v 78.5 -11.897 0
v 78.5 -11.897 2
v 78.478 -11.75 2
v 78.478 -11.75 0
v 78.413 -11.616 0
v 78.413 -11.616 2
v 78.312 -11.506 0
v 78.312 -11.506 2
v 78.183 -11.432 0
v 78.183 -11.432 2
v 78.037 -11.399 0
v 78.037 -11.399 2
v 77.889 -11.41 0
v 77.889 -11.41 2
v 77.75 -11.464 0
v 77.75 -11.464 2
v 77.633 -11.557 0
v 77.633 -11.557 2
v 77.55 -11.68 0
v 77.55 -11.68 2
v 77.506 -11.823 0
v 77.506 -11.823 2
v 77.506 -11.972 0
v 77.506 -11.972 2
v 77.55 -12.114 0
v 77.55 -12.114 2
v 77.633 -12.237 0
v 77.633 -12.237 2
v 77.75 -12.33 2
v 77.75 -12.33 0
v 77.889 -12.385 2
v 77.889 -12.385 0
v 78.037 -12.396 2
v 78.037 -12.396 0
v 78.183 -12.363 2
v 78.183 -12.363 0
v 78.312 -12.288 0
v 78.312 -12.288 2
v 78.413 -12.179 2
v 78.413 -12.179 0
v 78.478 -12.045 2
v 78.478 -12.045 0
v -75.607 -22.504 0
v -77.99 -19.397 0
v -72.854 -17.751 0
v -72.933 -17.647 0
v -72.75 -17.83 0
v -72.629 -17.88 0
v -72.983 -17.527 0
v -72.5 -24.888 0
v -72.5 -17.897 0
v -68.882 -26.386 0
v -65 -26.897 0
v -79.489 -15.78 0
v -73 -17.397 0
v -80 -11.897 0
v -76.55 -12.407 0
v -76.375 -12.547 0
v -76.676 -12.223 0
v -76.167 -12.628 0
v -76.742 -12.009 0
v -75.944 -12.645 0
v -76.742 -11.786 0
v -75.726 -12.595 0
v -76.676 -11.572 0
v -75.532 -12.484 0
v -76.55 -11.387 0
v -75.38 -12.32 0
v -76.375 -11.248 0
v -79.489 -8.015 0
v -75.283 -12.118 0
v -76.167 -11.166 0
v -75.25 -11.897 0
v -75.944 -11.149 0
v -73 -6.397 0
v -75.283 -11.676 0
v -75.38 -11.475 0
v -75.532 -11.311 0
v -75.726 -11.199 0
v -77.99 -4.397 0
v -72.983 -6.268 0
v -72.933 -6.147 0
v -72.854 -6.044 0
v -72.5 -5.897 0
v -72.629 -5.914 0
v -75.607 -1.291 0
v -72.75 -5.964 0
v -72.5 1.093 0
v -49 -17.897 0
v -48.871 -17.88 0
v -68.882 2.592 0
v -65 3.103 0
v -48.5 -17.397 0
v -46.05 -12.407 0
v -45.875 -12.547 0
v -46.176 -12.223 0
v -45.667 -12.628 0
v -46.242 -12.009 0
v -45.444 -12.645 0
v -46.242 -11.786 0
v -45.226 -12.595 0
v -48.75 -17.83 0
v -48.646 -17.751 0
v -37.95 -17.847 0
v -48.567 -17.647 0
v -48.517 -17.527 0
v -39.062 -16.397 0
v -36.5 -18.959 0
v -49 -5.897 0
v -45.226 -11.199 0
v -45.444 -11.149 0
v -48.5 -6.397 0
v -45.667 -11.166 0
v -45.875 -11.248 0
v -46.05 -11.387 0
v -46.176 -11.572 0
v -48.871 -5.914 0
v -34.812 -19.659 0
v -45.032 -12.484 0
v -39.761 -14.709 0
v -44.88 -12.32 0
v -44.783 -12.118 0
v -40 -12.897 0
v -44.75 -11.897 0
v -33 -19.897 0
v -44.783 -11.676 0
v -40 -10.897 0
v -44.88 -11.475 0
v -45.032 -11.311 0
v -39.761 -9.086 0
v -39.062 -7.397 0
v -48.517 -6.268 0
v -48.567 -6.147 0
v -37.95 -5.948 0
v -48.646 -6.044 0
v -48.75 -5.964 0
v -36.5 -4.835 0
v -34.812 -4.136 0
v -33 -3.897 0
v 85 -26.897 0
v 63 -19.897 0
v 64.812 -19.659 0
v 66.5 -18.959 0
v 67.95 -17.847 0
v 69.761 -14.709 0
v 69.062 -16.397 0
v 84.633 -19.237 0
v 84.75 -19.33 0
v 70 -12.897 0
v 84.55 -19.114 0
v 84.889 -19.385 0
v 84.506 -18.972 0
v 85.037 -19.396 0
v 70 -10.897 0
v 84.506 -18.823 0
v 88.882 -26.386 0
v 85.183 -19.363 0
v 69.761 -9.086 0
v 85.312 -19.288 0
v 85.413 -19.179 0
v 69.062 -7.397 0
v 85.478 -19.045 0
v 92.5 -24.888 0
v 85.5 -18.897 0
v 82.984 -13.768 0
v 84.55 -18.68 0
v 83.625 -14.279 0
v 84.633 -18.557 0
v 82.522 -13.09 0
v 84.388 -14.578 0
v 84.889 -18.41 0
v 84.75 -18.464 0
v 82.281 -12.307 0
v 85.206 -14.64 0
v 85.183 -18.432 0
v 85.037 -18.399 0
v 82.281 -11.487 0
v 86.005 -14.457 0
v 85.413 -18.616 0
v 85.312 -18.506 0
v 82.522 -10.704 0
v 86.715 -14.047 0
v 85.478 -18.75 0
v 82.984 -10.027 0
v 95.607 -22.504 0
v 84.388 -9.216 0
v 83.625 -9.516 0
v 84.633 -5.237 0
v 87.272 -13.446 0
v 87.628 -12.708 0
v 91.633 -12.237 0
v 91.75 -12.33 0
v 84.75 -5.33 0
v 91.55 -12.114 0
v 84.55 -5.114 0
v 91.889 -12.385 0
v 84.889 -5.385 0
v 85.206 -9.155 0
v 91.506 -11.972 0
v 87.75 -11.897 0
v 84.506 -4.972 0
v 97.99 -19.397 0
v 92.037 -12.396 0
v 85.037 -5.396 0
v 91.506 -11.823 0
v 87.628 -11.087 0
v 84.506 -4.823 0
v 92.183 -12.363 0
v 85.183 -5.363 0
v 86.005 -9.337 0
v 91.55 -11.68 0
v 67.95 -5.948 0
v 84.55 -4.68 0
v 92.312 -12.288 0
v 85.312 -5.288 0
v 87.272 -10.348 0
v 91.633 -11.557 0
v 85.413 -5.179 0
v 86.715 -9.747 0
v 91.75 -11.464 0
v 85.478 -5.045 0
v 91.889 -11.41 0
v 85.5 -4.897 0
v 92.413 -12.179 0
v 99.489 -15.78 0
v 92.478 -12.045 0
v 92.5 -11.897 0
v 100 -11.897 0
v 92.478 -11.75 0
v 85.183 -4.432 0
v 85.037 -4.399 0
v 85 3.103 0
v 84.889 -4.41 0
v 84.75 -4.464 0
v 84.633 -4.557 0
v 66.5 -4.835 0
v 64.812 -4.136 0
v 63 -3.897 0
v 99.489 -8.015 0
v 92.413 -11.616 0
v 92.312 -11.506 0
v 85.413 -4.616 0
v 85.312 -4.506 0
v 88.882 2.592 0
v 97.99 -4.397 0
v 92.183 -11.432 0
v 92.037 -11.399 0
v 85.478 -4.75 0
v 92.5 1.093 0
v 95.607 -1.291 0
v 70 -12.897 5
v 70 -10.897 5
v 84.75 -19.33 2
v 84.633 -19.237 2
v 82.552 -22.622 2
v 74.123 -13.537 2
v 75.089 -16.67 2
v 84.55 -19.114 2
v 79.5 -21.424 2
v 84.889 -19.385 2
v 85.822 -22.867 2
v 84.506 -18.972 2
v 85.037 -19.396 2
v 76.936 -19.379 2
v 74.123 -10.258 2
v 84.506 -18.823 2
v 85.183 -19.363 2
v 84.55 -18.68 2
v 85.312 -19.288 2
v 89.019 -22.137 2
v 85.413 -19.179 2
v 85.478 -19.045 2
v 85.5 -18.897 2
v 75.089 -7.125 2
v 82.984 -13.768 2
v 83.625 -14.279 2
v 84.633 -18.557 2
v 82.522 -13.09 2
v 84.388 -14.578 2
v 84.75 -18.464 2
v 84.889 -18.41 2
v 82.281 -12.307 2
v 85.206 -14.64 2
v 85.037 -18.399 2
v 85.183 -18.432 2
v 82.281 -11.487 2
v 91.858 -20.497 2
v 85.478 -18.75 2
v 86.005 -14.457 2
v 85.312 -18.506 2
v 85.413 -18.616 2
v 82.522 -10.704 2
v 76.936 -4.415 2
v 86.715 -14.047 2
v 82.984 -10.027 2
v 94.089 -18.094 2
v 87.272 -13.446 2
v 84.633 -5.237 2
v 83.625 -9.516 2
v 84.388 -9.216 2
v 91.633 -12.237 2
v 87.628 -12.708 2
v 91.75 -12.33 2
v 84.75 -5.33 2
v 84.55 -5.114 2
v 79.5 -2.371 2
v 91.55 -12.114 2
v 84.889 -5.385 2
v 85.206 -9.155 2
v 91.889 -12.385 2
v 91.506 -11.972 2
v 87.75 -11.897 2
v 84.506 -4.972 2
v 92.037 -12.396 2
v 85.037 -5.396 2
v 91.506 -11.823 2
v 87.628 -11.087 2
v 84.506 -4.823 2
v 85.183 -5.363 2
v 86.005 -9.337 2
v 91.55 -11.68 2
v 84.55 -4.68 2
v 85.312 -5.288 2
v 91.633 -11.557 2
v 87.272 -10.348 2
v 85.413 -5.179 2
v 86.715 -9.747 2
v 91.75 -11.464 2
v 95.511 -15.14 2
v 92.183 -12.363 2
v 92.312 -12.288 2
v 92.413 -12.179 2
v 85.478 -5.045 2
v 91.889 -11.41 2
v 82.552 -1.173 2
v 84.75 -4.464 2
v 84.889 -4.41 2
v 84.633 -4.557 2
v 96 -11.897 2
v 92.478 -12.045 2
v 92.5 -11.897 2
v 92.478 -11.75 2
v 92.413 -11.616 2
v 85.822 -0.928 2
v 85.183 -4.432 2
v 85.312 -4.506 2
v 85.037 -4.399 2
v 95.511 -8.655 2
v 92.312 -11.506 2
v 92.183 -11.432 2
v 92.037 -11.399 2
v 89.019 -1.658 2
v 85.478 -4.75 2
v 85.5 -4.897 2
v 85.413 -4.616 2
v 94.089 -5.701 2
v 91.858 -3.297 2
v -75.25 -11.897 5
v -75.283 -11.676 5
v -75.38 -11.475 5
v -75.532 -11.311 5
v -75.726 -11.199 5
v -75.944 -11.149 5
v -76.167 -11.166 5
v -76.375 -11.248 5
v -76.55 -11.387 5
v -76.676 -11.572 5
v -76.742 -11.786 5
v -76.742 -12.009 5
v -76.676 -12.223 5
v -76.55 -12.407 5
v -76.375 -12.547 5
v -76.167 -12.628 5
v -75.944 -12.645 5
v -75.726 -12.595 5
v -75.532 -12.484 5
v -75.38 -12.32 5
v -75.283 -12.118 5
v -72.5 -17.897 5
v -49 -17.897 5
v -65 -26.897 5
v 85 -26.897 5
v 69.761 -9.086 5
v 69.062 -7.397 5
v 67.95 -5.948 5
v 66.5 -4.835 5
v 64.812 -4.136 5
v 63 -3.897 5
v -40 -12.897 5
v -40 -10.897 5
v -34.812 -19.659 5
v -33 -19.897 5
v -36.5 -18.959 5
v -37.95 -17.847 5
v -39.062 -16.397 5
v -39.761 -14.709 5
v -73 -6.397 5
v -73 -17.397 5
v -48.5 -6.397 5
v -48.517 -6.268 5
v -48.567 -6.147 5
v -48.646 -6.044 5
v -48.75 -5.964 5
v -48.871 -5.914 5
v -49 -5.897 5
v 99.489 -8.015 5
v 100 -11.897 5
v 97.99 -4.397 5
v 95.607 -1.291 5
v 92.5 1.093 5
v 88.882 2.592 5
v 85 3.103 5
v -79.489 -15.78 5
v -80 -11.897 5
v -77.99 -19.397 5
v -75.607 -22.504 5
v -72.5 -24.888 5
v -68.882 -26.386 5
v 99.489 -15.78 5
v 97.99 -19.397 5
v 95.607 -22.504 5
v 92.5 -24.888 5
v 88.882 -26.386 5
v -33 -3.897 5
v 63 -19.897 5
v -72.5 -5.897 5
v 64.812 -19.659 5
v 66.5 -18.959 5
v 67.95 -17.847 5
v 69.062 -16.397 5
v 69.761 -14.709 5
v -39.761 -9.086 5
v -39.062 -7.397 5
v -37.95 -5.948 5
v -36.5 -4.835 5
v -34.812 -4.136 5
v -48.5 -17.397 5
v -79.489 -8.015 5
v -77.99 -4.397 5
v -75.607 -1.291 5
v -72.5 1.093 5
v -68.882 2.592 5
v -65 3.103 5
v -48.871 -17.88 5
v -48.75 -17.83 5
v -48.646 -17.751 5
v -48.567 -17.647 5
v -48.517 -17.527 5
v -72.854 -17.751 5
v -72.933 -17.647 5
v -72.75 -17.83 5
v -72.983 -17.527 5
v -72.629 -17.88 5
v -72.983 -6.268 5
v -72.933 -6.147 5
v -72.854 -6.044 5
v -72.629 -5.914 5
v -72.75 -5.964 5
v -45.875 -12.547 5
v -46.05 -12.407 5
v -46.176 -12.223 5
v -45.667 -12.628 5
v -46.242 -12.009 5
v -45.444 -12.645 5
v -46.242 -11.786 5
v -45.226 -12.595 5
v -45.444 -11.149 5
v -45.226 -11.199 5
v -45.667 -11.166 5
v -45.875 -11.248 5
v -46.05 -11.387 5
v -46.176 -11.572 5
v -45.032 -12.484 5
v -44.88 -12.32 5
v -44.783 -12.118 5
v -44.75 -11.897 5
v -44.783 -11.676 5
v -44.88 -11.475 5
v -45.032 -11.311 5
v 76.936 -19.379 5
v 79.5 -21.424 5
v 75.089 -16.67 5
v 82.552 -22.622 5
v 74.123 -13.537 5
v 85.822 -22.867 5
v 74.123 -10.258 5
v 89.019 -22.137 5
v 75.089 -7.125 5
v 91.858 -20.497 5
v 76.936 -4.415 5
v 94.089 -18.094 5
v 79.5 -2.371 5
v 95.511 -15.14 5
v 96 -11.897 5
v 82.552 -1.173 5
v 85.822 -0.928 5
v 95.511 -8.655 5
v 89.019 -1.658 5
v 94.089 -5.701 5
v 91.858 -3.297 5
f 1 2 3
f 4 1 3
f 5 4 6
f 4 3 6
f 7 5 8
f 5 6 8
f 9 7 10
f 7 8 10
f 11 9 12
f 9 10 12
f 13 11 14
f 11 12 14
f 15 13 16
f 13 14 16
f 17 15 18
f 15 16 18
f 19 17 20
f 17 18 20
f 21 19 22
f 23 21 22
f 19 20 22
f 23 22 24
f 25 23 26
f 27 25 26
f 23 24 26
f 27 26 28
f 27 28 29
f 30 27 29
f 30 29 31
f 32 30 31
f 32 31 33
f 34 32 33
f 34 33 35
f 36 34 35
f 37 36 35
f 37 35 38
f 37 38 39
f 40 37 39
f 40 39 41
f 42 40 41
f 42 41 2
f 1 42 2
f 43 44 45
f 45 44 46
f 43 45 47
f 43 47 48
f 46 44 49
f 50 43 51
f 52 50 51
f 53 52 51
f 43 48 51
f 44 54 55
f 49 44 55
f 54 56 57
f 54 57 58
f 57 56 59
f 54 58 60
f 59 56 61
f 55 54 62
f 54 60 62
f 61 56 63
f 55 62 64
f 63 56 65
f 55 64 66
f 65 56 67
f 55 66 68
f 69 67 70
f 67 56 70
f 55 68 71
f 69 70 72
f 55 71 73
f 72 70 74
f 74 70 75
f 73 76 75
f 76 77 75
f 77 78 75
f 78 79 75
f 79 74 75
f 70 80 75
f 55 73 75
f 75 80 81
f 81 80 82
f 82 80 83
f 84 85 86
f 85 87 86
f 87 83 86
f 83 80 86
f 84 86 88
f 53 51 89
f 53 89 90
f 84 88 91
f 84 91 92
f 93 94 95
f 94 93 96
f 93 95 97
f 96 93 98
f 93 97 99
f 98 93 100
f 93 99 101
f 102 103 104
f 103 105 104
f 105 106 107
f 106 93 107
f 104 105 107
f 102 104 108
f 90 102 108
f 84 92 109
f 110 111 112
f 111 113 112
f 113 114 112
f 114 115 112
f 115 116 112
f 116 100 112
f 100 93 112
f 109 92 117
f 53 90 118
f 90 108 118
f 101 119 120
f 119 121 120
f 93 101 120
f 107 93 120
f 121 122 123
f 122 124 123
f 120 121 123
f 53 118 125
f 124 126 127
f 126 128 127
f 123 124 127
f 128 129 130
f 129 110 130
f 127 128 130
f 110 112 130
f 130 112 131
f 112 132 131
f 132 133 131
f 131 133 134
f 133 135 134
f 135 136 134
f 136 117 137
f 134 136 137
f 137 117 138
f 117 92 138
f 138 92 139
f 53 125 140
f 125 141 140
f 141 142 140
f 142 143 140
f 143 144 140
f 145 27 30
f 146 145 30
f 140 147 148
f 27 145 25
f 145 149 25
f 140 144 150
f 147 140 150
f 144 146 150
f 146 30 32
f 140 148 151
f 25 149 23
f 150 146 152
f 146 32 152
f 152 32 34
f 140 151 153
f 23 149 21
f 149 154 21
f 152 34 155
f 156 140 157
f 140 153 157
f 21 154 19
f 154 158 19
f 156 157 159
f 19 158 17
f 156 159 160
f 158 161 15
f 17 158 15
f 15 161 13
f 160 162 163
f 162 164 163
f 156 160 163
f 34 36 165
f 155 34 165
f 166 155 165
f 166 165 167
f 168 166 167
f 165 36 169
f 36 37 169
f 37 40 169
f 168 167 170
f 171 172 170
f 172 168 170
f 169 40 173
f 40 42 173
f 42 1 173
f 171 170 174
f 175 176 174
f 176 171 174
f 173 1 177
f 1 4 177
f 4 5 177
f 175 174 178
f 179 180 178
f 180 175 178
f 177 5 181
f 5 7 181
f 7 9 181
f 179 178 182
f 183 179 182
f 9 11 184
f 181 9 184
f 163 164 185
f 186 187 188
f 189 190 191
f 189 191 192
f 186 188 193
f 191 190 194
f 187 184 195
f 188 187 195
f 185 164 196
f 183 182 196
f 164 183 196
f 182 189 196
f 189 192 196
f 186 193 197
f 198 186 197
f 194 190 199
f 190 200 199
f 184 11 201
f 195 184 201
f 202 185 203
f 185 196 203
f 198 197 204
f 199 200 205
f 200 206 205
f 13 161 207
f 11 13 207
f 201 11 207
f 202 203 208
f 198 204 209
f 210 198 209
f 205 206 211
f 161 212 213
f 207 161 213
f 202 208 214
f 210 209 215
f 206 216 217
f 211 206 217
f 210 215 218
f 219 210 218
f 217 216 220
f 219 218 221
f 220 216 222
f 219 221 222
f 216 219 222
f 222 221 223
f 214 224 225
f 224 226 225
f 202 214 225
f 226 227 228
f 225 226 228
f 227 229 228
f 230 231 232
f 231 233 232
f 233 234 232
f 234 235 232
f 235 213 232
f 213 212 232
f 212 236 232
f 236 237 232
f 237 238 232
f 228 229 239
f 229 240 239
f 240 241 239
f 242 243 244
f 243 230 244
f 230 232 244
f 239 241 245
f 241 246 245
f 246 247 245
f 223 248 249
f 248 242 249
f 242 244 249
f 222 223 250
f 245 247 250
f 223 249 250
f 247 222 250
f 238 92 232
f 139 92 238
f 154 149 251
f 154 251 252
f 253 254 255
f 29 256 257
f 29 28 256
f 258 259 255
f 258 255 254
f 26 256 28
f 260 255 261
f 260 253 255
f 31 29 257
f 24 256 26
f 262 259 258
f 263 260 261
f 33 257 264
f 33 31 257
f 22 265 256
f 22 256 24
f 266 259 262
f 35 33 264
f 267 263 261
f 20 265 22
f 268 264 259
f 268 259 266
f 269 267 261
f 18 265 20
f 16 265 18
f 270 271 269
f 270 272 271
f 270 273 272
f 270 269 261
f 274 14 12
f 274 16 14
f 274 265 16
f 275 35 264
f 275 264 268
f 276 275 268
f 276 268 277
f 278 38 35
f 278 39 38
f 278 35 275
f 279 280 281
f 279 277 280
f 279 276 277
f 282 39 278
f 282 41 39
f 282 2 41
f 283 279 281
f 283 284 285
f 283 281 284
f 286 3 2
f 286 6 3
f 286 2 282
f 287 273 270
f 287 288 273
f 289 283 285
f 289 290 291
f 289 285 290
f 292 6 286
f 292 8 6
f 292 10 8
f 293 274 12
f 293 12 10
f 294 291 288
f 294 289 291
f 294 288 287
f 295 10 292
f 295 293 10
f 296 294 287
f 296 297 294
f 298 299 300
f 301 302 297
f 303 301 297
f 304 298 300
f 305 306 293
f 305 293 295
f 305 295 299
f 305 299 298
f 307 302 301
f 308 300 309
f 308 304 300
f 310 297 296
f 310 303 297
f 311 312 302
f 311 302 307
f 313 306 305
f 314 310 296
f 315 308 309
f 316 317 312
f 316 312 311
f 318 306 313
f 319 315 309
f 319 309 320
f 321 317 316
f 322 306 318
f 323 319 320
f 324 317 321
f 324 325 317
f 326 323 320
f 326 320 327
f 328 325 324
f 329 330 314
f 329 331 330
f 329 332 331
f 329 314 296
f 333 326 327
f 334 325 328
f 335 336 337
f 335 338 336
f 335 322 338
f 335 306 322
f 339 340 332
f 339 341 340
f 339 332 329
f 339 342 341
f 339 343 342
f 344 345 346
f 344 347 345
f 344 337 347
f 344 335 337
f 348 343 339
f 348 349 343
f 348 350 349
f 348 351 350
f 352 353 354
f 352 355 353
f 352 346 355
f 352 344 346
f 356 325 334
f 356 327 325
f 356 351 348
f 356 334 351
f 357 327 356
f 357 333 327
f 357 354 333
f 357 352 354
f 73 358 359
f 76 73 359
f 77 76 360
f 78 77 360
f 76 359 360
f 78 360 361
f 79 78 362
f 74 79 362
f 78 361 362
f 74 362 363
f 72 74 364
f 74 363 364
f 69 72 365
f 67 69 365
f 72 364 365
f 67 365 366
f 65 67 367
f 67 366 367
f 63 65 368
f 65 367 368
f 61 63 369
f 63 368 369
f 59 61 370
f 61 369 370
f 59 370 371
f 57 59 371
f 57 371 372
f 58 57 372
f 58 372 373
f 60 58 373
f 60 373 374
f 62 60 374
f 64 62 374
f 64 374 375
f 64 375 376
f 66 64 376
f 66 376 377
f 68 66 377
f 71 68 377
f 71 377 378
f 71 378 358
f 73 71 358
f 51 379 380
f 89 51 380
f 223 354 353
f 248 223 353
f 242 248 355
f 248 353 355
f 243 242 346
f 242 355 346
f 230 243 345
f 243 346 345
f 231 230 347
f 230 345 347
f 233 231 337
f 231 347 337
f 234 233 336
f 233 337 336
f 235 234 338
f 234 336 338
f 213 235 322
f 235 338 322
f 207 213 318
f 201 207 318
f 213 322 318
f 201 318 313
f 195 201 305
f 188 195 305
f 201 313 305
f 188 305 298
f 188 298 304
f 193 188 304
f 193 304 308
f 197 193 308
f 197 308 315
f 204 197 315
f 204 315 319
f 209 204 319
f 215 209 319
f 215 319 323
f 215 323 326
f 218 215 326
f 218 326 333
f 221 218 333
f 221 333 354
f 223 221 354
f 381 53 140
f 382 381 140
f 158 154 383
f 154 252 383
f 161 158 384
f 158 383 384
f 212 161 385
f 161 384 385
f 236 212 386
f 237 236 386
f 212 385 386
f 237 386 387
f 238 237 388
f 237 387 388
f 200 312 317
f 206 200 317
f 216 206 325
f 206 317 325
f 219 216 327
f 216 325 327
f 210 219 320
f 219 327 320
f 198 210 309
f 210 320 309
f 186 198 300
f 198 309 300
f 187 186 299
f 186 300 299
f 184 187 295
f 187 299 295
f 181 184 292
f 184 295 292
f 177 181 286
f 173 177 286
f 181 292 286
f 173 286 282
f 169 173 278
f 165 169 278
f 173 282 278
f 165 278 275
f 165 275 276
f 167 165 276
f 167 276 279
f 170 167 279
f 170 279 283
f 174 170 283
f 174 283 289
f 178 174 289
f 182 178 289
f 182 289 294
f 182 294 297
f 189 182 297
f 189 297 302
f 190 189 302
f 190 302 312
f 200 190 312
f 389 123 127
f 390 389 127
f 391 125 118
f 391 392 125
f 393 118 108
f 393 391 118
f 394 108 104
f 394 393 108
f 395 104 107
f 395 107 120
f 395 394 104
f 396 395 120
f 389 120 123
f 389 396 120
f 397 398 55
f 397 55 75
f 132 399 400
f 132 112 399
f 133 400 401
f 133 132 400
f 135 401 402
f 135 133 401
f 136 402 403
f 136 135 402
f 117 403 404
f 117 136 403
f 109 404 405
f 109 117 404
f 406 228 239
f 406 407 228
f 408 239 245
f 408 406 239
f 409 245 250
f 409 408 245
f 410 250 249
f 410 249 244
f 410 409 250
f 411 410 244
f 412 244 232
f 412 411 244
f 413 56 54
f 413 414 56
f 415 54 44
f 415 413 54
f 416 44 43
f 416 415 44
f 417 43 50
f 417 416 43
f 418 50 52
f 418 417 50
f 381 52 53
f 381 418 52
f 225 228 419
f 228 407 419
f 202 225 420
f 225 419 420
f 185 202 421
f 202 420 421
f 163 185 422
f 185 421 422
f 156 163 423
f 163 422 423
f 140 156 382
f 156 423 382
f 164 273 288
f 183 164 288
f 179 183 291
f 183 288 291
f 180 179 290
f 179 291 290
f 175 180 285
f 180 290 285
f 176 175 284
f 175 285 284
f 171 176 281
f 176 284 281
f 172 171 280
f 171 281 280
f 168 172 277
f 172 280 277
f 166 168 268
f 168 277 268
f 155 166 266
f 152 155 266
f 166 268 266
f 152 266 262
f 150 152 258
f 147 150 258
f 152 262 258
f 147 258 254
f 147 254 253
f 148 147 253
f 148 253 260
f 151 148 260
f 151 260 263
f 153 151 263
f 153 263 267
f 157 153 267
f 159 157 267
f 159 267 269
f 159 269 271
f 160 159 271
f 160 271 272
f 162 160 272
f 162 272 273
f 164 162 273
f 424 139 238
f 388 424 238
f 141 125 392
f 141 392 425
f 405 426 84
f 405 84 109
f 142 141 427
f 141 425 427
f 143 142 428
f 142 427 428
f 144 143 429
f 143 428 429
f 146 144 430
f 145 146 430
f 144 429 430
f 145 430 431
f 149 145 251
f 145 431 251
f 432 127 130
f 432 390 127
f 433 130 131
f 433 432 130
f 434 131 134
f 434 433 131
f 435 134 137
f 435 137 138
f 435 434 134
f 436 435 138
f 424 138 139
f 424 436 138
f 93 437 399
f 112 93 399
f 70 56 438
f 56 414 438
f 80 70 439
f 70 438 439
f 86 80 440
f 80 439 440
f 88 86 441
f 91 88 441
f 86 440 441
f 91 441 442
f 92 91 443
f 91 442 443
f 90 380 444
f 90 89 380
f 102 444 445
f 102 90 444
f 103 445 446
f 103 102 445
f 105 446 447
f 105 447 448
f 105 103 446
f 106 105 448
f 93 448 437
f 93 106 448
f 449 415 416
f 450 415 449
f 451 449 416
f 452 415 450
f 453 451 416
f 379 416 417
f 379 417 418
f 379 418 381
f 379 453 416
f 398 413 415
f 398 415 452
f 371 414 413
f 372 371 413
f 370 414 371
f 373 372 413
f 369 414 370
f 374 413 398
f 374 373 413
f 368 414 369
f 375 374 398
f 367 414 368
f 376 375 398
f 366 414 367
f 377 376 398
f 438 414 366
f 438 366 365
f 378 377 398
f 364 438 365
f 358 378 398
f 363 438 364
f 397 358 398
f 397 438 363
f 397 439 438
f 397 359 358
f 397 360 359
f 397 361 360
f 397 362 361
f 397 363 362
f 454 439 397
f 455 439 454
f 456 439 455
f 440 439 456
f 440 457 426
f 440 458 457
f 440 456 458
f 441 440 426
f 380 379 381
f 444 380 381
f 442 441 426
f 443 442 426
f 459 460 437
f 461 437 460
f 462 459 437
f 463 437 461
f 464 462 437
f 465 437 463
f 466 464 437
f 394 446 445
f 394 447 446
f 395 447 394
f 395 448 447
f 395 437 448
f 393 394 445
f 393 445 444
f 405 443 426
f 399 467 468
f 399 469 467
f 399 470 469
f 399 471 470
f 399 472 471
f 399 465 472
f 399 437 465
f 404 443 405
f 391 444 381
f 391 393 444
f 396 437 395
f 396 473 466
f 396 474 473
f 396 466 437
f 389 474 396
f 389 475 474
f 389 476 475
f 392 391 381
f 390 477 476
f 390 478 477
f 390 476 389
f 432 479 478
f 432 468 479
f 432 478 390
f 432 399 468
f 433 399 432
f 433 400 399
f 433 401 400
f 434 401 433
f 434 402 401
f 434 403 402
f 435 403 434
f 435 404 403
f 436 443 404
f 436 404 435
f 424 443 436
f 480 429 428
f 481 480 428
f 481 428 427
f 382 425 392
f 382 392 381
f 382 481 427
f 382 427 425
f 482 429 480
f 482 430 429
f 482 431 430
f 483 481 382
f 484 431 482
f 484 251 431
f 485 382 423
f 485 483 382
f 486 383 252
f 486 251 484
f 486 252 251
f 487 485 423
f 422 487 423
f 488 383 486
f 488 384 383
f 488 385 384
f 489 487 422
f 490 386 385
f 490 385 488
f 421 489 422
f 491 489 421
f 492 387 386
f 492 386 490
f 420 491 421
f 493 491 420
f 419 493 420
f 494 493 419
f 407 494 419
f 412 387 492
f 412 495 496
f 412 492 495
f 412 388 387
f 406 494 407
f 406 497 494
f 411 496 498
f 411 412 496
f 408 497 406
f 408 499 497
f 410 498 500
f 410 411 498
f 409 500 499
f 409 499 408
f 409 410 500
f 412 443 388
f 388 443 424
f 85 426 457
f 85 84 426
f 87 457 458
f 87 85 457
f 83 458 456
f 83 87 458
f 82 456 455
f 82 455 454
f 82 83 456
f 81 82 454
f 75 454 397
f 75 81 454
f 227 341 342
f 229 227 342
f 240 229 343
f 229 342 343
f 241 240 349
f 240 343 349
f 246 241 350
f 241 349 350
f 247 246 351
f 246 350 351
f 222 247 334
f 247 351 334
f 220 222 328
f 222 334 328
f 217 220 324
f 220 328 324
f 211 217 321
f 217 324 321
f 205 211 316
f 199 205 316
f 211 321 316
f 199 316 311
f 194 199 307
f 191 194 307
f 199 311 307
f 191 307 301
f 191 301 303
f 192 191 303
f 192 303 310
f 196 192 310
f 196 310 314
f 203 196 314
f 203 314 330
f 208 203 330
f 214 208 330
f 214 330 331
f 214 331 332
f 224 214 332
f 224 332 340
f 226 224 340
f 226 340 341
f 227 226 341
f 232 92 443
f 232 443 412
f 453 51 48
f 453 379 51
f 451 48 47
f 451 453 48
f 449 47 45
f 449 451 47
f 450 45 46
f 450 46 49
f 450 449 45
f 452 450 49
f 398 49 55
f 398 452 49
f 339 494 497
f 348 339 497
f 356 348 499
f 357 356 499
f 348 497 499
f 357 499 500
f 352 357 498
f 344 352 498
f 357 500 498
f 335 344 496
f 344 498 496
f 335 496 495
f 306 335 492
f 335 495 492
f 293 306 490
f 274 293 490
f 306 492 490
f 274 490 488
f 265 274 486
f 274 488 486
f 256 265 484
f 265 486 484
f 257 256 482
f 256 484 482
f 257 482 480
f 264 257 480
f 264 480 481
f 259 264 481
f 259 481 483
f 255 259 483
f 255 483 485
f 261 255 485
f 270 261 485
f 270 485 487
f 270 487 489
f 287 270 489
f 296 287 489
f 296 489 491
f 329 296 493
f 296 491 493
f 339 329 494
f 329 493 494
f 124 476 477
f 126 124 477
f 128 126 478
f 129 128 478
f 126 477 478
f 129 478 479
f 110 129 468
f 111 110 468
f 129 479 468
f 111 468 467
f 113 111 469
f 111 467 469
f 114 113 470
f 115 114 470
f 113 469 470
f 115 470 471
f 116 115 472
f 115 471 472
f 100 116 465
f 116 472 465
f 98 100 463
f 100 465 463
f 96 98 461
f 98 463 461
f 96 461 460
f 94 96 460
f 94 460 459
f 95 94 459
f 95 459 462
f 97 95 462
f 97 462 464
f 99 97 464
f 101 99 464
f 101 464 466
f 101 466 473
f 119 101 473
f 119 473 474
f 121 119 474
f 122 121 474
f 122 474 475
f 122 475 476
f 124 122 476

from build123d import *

# Parameters (mm, degrees)
F0_W     = 180
F0_H     = 30
F0_W_2   = 110
F0_H_2   = 16
F1_DEPTH = 5
F2_R     = 11
F2_R_2   = 0.5
F2_R_3   = 2.75
F2_W     = 24.5
F2_H     = 12
F3_DEPTH = 3
F2_R_4   = 0.75
F4_DEPTH = 25
F5_R     = 14.99999
F6_R     = 7
F7_R     = 0.5


# Not quite as in the source:
# - a fillet or chamfer is up to 0.001 mm smaller than in the source, because OpenCascade refuses the exact size
# - a feature names something its author has since deleted; it is built from what else it names


with BuildPart() as f1:
    # F0 (on Top) → F1 (new body)
    with BuildSketch(Plane.XY):
        with Locations((10, -11.8972941886)):
            Rectangle(F0_W, F0_H)
        with Locations((15, -11.8972941886)):
            Rectangle(F0_W_2, F0_H_2, mode=Mode.SUBTRACT)
    extrude(amount=F1_DEPTH)

    # F2 (on face) → F3 (cut)
    with BuildSketch(Plane.XY.offset(5)):
        with Locations((85, -11.8972941886)):
            Circle(F2_R)
        with Locations((85, -18.8972941886)):
            Circle(F2_R_2, mode=Mode.SUBTRACT)
        with Locations((85, -11.8972941886)):
            Circle(F2_R_3, mode=Mode.SUBTRACT)
        with Locations((78, -11.8972941886)):
            Circle(F2_R_2, mode=Mode.SUBTRACT)
        with Locations((92, -11.8972941886)):
            Circle(F2_R_2, mode=Mode.SUBTRACT)
        with Locations((85, -4.8972941886)):
            Circle(F2_R_2, mode=Mode.SUBTRACT)
        with Locations((-60.75, -11.8972941886)):
            Rectangle(F2_W, F2_H)
        with Locations((-65, -11.8972941886)):
            Circle(F2_R_3, mode=Mode.SUBTRACT)
    extrude(amount=-F3_DEPTH, mode=Mode.SUBTRACT)

    # F2 (on face) → F4 (cut)
    with BuildSketch(Plane.XY.offset(5)):
        with Locations((-60.75, -11.8972941886)):
            Rectangle(F2_W, F2_H)
        with Locations((-65, -11.8972941886)):
            Circle(F2_R_3, mode=Mode.SUBTRACT)
        with Locations((85, -11.8972941886)):
            Circle(F2_R_3)
        with Locations((-65, -11.8972941886)):
            Circle(F2_R_3)
        with Locations((-76, -11.8972941886)):
            Circle(F2_R_4)
        with Locations((-45.5, -11.8972941886)):
            Circle(F2_R_4)
        with Locations((85, -4.8972941886)):
            Circle(F2_R_2)
        with Locations((78, -11.8972941886)):
            Circle(F2_R_2)
        with Locations((85, -18.8972941886)):
            Circle(F2_R_2)
        with Locations((92, -11.8972941886)):
            Circle(F2_R_2)
    extrude(amount=-F4_DEPTH, mode=Mode.SUBTRACT)

    # F5 (radius 15 in the source; OpenCascade refuses exactly that, so slightly less here)
    f5_edges = [f1.edges().sort_by_distance(p)[0] for p in [
        (100, 3.102706, 2.5),
        (100, -26.897294, 2.5),
        (-80, -26.897294, 2.5),
        (-80, 3.102706, 2.5),
    ]]
    fillet(f5_edges, radius=F5_R)

    # F6
    f6_edges = [f1.edges().sort_by_distance(p)[0] for p in [
        (-40, -3.897294, 2.5),
        (-40, -19.897294, 2.5),
        (70, -3.897294, 2.5),
        (70, -19.897294, 2.5),
    ]]
    fillet(f6_edges, radius=F6_R)

    # F7
    f7_edges = [f1.edges().sort_by_distance(p)[0] for p in [
        (-73, -5.897294, 2.5),
        (-73, -17.897294, 2.5),
        (-48.5, -5.897294, 2.5),
        (-48.5, -17.897294, 2.5),
    ]]
    fillet(f7_edges, radius=F7_R)


solid = f1.part
